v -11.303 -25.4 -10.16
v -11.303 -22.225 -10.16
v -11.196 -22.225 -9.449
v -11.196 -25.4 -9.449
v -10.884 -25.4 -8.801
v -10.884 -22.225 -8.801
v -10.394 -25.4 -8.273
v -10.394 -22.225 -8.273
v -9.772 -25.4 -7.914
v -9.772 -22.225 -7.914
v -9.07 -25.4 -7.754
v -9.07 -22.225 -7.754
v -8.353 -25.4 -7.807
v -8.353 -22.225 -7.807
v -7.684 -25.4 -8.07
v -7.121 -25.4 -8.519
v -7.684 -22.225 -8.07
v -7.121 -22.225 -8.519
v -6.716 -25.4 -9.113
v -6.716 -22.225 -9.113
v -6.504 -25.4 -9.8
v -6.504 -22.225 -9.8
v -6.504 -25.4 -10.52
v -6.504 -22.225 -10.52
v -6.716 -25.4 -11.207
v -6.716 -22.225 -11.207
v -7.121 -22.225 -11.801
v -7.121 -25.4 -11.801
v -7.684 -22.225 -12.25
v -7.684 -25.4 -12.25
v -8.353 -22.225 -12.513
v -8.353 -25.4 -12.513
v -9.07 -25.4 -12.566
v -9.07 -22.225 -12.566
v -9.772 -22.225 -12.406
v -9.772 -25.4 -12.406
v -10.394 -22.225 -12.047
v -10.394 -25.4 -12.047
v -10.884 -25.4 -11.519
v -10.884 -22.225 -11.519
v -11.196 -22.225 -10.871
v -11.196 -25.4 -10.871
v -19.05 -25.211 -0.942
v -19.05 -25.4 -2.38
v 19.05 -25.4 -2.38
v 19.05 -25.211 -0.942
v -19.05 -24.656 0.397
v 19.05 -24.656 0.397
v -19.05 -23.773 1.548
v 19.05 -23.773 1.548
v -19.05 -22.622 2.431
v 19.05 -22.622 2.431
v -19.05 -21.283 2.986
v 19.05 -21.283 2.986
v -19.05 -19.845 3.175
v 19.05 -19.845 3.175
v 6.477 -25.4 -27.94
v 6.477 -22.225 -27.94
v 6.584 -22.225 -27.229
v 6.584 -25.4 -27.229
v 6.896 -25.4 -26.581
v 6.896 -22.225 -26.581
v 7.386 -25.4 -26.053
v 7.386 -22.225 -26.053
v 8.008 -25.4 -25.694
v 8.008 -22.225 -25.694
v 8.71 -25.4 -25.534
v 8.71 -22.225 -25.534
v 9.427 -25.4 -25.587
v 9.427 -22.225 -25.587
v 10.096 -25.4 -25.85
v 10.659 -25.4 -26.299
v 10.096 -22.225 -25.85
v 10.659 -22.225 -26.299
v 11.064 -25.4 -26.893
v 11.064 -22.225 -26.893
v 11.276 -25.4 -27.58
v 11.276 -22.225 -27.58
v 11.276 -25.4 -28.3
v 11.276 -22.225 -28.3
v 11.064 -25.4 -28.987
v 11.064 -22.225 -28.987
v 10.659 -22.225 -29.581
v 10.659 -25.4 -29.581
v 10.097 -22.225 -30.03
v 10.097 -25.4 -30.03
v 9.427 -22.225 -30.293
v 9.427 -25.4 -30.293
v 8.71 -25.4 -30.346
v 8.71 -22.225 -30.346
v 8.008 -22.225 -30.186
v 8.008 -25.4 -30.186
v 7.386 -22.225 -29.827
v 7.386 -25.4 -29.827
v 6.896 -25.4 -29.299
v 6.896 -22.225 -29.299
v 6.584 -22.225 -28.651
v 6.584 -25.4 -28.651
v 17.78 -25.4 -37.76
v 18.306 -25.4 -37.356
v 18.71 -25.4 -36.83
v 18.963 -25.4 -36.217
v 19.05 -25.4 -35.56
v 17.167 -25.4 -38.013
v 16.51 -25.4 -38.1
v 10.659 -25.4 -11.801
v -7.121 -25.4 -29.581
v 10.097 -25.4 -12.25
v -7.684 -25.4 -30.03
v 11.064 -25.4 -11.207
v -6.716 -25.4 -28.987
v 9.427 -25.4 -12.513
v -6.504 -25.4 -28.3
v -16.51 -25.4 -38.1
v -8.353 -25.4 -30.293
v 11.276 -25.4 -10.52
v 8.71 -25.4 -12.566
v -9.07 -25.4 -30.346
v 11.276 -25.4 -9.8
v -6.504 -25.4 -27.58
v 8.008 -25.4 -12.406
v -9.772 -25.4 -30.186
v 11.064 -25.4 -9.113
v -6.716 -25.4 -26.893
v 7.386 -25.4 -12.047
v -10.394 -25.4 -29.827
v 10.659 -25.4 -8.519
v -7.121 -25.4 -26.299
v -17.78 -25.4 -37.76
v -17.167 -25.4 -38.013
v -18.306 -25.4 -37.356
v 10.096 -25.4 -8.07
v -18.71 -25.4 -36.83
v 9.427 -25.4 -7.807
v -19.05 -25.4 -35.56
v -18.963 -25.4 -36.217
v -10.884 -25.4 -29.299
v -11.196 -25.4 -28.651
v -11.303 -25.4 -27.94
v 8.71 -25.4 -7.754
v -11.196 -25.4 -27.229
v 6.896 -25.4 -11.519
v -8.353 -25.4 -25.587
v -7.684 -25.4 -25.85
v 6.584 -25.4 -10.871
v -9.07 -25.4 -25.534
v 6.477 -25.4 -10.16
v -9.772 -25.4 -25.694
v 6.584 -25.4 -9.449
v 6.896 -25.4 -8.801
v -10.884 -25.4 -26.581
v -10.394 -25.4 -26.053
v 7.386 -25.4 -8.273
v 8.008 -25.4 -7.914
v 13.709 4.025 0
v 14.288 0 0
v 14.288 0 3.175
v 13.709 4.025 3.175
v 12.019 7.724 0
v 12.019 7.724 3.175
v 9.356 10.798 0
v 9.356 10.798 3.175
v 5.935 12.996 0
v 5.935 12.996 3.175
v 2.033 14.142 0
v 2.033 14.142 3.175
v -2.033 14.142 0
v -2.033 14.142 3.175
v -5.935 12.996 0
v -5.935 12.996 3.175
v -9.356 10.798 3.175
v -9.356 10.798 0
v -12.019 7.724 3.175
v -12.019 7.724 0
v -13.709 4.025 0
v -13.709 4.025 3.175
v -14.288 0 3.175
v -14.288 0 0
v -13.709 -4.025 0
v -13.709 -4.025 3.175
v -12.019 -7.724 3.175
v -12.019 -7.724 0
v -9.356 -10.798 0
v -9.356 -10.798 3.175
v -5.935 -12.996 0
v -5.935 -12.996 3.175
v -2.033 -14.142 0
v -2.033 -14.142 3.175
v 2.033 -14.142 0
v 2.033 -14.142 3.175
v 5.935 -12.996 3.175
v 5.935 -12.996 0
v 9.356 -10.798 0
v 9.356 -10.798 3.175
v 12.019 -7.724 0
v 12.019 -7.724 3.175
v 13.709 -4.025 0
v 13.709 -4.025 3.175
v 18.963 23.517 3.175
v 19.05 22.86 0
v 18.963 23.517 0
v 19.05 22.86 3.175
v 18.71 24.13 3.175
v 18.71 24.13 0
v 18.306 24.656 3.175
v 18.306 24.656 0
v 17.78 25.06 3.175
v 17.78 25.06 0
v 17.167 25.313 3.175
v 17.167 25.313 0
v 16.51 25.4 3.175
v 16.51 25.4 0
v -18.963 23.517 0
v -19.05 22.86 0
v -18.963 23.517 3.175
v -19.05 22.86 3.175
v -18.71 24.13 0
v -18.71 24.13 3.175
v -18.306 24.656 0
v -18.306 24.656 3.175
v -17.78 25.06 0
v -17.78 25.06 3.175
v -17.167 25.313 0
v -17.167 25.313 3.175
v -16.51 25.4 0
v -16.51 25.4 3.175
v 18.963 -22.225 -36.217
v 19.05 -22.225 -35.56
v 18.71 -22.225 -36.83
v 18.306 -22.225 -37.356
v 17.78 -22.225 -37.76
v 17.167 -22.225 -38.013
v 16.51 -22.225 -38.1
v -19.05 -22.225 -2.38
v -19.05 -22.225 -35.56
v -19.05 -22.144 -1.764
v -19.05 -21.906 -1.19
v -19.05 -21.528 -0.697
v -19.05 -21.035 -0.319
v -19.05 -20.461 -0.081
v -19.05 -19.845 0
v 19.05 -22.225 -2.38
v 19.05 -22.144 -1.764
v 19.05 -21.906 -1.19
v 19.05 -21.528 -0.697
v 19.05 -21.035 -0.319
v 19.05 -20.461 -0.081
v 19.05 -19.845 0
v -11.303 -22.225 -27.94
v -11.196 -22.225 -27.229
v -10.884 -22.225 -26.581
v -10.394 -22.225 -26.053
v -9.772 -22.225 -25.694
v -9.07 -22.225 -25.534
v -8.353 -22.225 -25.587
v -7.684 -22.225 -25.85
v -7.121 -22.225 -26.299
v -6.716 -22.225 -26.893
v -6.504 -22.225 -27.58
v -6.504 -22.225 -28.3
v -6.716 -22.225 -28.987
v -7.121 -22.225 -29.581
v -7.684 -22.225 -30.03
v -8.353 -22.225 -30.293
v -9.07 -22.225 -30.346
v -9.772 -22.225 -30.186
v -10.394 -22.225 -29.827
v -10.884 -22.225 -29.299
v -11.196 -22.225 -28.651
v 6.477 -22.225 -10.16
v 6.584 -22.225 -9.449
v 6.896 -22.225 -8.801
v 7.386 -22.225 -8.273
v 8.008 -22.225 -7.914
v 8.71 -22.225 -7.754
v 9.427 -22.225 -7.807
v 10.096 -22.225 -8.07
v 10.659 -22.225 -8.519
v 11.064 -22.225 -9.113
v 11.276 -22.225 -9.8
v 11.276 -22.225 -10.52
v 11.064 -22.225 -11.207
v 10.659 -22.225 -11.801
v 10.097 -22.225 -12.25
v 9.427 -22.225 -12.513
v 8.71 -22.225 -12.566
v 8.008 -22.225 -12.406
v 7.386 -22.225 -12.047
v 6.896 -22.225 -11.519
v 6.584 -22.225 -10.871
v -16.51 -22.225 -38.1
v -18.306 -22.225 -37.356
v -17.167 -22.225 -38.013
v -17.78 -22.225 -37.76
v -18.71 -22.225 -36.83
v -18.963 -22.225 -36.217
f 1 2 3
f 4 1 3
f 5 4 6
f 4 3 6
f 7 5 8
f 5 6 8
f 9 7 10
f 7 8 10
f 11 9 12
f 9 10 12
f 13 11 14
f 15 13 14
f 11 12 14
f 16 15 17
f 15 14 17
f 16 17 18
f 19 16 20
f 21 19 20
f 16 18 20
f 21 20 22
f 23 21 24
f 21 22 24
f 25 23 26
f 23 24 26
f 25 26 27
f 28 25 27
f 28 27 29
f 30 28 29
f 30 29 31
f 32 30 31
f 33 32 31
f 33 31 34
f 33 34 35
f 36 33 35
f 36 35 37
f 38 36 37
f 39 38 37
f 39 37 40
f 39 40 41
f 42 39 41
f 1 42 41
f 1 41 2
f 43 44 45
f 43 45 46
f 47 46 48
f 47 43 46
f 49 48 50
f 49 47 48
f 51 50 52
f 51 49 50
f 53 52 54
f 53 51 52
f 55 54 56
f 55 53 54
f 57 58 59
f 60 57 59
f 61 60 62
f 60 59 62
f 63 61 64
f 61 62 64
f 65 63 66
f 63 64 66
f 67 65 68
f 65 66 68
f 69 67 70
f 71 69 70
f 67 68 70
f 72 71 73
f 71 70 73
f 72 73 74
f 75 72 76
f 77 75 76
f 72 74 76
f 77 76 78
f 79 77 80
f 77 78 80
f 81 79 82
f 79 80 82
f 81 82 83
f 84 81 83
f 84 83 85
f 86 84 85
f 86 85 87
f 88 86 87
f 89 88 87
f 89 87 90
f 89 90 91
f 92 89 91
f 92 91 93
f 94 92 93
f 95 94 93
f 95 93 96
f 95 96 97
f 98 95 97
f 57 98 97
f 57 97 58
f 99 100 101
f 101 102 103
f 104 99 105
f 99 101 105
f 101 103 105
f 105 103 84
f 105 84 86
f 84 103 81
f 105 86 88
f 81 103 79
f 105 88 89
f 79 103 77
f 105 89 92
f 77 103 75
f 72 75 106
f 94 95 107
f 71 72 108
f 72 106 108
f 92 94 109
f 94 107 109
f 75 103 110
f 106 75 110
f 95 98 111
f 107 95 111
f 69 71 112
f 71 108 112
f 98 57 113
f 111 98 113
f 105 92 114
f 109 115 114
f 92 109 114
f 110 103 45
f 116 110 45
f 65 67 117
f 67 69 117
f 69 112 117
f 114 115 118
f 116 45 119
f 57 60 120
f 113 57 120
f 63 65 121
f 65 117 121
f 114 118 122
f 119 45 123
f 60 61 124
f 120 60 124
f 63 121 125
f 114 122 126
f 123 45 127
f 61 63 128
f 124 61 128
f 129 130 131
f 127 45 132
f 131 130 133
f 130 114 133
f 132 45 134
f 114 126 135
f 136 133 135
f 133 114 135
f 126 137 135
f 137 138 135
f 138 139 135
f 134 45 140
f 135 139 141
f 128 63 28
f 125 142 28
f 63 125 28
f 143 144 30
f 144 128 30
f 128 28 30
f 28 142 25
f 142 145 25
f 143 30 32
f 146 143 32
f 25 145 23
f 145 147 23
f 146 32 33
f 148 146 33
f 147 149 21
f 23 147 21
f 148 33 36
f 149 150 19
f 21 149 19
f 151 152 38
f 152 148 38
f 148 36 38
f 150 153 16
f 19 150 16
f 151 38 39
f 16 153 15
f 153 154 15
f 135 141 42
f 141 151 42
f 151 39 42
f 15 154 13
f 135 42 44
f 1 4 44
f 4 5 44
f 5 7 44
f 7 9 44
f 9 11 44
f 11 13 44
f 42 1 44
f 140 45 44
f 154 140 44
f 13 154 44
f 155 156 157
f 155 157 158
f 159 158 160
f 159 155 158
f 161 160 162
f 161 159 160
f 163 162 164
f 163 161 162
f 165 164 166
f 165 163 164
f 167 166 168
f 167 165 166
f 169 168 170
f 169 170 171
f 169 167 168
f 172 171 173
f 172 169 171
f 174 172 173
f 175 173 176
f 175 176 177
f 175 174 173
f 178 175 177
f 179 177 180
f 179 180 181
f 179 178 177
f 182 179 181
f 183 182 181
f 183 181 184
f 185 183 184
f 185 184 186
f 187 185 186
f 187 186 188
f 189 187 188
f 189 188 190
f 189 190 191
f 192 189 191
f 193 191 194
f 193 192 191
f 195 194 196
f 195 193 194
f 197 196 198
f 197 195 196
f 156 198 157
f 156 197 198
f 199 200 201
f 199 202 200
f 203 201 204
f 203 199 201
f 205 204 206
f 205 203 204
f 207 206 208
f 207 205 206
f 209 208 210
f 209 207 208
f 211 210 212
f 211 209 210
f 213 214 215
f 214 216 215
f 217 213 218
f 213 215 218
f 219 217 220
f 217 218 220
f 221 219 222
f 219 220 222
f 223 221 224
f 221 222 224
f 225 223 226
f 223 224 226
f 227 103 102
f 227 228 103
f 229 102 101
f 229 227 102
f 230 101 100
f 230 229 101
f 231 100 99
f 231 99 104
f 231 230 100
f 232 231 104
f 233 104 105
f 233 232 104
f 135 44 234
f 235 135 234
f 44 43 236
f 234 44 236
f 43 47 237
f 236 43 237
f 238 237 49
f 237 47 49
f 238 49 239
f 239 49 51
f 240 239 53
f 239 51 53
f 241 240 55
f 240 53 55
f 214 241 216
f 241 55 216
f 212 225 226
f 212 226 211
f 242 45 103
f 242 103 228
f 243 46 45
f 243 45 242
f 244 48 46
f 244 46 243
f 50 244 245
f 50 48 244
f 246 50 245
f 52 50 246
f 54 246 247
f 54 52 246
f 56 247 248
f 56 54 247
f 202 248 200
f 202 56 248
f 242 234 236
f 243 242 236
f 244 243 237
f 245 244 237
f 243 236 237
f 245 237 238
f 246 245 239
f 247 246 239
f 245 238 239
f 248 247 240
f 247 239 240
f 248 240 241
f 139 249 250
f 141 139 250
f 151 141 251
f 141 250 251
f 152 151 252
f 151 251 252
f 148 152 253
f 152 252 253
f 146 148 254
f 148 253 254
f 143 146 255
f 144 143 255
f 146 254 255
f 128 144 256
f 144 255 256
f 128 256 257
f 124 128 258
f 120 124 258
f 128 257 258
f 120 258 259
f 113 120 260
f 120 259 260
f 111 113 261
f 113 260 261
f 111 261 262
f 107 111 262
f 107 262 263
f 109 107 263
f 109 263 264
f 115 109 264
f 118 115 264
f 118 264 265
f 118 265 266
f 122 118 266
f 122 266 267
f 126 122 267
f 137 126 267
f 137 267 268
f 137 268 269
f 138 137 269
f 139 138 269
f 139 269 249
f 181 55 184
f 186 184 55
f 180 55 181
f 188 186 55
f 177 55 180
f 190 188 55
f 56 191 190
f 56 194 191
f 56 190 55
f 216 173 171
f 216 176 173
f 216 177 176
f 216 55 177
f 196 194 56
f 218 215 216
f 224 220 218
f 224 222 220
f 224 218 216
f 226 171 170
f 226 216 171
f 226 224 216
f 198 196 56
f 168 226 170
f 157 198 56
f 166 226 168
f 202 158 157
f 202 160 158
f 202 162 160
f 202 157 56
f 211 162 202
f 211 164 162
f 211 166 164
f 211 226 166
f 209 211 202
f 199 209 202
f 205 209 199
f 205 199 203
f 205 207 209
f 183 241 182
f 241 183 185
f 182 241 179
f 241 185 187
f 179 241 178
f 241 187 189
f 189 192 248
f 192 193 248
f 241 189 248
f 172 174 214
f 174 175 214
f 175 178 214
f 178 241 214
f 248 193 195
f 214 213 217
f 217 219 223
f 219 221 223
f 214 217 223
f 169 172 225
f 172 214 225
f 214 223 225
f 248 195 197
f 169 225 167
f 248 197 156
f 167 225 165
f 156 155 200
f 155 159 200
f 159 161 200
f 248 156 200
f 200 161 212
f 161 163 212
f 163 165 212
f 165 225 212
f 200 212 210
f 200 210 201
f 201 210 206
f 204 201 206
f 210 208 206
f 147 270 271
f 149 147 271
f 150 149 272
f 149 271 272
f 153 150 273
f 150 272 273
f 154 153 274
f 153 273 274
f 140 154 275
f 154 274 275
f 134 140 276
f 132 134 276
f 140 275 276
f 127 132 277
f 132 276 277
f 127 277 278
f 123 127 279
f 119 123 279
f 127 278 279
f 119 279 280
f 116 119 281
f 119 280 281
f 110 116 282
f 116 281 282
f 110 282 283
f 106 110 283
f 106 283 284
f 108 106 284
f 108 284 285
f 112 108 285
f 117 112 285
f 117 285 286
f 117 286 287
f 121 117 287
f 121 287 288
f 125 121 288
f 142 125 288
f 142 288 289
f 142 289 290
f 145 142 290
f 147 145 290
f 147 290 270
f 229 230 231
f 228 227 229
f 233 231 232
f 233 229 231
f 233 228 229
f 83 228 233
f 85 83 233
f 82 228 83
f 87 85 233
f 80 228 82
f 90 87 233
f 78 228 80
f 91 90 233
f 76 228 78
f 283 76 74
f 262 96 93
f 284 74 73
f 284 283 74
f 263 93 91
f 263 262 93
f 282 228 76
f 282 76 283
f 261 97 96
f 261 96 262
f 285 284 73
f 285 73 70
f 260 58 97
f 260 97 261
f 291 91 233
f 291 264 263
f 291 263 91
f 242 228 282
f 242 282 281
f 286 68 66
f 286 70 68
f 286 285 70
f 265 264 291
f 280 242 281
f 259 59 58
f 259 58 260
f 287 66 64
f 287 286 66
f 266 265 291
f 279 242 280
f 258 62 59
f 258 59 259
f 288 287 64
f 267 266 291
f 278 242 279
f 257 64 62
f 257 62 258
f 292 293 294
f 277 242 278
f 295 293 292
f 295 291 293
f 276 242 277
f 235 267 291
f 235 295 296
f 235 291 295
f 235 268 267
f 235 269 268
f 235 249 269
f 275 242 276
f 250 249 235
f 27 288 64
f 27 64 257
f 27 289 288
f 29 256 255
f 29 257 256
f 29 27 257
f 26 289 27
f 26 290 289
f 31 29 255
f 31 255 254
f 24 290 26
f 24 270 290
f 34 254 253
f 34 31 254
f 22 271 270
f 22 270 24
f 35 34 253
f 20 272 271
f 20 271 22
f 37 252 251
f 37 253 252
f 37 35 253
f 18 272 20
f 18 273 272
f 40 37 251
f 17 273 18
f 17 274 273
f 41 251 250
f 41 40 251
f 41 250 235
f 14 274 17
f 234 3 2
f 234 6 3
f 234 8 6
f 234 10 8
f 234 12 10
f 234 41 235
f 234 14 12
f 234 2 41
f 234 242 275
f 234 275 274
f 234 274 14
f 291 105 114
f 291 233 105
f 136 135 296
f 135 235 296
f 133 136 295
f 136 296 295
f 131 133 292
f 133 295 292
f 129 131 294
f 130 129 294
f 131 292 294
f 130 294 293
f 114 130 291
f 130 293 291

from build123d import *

# Parameters (mm, degrees)
SKETCH1_W              = 38.1
SKETCH1_H              = 50.8
SKETCH1_R              = 14.2875
BOSS_EXTRUDE1_DEPTH    = 3.175
SKETCH2_W              = 38.1
SKETCH2_H              = 3.175
BOSS_EXTRUDE2_DEPTH    = 38.1
SKETCH3_R              = 2.413
CUT_EXTRUDE1_DEPTH     = 64.895642457
CONVERT_SOLID1_START   = -19.05
CONVERT_SOLID1_DEPTH   = 38.1
CONVERT_SOLID1_2_DEPTH = 38.1
FILLET1_R              = 2.54


# Read off the part's stored shape, not the designer's step: Convert-Solid1
with BuildPart() as part:
    # Sketch1 → Boss-Extrude1 (new body)
    with BuildSketch(Plane.XY):
        Rectangle(SKETCH1_W, SKETCH1_H)
        Circle(SKETCH1_R, mode=Mode.SUBTRACT)
    extrude(amount=BOSS_EXTRUDE1_DEPTH)

    # Sketch2 → Boss-Extrude2 (add)
    with BuildSketch(Plane(origin=(0, 0, 0), x_dir=(-1, 0, 0), z_dir=(0, 0, -1))):
        with Locations((0, -23.8125)):
            Rectangle(SKETCH2_W, SKETCH2_H)
    extrude(amount=BOSS_EXTRUDE2_DEPTH)

    # Sketch3 → Cut-Extrude1 (cut, through all)
    with BuildSketch(Plane(origin=(0, -22.225, 0), x_dir=(1, 0, 0), z_dir=(0, 1, 0))):
        with Locations(Location((-8.89, 27.94, 0), (0, 0, 180))):
            Circle(SKETCH3_R)
        with Locations(Location((8.89, 27.94, 0), (0, 0, 180))):
            Circle(SKETCH3_R)
        with Locations(Location((-8.89, 10.16, 0), (0, 0, 180))):
            Circle(SKETCH3_R)
        with Locations(Location((8.89, 10.16, 0), (0, 0, 180))):
            Circle(SKETCH3_R)
    extrude(amount=-CUT_EXTRUDE1_DEPTH, mode=Mode.SUBTRACT)

    # Convert-Solid1 outline → Convert-Solid1 (cut)
    with BuildSketch(Plane.YZ.offset(CONVERT_SOLID1_START)):
        with BuildLine():
            ThreePointArc((-25.4, -2.380000066), (-23.77297815, 1.54797815), (-19.844999934, 3.175))
            Line((-19.844999934, 3.175), (-25.4, 3.175))
            Line((-25.4, 3.175), (-25.4, -2.380000066))
        make_face()
    extrude(amount=CONVERT_SOLID1_DEPTH, mode=Mode.SUBTRACT)

    # Convert-Solid1 2 outline → Convert-Solid1 2 (add)
    with BuildSketch(Plane.YZ.offset(CONVERT_SOLID1_START)):
        with BuildLine():
            ThreePointArc((-22.225, -2.380000066), (-21.52791412, -0.69708588), (-19.844999934, 0))
            Line((-19.844999934, 0), (-22.225, 0))
            Line((-22.225, 0), (-22.225, -2.380000066))
        make_face()
    extrude(amount=CONVERT_SOLID1_2_DEPTH)

    # Fillet1
    fillet1_edges = [part.edges().sort_by_distance(p)[0] for p in [
        (19.05, 25.4, 1.5875),
        (-19.05, 25.4, 1.5875),
        (-19.05, -23.8125, -38.1),
        (19.05, -23.8125, -38.1),
    ]]
    fillet(fillet1_edges, radius=FILLET1_R)


solid = part.part
